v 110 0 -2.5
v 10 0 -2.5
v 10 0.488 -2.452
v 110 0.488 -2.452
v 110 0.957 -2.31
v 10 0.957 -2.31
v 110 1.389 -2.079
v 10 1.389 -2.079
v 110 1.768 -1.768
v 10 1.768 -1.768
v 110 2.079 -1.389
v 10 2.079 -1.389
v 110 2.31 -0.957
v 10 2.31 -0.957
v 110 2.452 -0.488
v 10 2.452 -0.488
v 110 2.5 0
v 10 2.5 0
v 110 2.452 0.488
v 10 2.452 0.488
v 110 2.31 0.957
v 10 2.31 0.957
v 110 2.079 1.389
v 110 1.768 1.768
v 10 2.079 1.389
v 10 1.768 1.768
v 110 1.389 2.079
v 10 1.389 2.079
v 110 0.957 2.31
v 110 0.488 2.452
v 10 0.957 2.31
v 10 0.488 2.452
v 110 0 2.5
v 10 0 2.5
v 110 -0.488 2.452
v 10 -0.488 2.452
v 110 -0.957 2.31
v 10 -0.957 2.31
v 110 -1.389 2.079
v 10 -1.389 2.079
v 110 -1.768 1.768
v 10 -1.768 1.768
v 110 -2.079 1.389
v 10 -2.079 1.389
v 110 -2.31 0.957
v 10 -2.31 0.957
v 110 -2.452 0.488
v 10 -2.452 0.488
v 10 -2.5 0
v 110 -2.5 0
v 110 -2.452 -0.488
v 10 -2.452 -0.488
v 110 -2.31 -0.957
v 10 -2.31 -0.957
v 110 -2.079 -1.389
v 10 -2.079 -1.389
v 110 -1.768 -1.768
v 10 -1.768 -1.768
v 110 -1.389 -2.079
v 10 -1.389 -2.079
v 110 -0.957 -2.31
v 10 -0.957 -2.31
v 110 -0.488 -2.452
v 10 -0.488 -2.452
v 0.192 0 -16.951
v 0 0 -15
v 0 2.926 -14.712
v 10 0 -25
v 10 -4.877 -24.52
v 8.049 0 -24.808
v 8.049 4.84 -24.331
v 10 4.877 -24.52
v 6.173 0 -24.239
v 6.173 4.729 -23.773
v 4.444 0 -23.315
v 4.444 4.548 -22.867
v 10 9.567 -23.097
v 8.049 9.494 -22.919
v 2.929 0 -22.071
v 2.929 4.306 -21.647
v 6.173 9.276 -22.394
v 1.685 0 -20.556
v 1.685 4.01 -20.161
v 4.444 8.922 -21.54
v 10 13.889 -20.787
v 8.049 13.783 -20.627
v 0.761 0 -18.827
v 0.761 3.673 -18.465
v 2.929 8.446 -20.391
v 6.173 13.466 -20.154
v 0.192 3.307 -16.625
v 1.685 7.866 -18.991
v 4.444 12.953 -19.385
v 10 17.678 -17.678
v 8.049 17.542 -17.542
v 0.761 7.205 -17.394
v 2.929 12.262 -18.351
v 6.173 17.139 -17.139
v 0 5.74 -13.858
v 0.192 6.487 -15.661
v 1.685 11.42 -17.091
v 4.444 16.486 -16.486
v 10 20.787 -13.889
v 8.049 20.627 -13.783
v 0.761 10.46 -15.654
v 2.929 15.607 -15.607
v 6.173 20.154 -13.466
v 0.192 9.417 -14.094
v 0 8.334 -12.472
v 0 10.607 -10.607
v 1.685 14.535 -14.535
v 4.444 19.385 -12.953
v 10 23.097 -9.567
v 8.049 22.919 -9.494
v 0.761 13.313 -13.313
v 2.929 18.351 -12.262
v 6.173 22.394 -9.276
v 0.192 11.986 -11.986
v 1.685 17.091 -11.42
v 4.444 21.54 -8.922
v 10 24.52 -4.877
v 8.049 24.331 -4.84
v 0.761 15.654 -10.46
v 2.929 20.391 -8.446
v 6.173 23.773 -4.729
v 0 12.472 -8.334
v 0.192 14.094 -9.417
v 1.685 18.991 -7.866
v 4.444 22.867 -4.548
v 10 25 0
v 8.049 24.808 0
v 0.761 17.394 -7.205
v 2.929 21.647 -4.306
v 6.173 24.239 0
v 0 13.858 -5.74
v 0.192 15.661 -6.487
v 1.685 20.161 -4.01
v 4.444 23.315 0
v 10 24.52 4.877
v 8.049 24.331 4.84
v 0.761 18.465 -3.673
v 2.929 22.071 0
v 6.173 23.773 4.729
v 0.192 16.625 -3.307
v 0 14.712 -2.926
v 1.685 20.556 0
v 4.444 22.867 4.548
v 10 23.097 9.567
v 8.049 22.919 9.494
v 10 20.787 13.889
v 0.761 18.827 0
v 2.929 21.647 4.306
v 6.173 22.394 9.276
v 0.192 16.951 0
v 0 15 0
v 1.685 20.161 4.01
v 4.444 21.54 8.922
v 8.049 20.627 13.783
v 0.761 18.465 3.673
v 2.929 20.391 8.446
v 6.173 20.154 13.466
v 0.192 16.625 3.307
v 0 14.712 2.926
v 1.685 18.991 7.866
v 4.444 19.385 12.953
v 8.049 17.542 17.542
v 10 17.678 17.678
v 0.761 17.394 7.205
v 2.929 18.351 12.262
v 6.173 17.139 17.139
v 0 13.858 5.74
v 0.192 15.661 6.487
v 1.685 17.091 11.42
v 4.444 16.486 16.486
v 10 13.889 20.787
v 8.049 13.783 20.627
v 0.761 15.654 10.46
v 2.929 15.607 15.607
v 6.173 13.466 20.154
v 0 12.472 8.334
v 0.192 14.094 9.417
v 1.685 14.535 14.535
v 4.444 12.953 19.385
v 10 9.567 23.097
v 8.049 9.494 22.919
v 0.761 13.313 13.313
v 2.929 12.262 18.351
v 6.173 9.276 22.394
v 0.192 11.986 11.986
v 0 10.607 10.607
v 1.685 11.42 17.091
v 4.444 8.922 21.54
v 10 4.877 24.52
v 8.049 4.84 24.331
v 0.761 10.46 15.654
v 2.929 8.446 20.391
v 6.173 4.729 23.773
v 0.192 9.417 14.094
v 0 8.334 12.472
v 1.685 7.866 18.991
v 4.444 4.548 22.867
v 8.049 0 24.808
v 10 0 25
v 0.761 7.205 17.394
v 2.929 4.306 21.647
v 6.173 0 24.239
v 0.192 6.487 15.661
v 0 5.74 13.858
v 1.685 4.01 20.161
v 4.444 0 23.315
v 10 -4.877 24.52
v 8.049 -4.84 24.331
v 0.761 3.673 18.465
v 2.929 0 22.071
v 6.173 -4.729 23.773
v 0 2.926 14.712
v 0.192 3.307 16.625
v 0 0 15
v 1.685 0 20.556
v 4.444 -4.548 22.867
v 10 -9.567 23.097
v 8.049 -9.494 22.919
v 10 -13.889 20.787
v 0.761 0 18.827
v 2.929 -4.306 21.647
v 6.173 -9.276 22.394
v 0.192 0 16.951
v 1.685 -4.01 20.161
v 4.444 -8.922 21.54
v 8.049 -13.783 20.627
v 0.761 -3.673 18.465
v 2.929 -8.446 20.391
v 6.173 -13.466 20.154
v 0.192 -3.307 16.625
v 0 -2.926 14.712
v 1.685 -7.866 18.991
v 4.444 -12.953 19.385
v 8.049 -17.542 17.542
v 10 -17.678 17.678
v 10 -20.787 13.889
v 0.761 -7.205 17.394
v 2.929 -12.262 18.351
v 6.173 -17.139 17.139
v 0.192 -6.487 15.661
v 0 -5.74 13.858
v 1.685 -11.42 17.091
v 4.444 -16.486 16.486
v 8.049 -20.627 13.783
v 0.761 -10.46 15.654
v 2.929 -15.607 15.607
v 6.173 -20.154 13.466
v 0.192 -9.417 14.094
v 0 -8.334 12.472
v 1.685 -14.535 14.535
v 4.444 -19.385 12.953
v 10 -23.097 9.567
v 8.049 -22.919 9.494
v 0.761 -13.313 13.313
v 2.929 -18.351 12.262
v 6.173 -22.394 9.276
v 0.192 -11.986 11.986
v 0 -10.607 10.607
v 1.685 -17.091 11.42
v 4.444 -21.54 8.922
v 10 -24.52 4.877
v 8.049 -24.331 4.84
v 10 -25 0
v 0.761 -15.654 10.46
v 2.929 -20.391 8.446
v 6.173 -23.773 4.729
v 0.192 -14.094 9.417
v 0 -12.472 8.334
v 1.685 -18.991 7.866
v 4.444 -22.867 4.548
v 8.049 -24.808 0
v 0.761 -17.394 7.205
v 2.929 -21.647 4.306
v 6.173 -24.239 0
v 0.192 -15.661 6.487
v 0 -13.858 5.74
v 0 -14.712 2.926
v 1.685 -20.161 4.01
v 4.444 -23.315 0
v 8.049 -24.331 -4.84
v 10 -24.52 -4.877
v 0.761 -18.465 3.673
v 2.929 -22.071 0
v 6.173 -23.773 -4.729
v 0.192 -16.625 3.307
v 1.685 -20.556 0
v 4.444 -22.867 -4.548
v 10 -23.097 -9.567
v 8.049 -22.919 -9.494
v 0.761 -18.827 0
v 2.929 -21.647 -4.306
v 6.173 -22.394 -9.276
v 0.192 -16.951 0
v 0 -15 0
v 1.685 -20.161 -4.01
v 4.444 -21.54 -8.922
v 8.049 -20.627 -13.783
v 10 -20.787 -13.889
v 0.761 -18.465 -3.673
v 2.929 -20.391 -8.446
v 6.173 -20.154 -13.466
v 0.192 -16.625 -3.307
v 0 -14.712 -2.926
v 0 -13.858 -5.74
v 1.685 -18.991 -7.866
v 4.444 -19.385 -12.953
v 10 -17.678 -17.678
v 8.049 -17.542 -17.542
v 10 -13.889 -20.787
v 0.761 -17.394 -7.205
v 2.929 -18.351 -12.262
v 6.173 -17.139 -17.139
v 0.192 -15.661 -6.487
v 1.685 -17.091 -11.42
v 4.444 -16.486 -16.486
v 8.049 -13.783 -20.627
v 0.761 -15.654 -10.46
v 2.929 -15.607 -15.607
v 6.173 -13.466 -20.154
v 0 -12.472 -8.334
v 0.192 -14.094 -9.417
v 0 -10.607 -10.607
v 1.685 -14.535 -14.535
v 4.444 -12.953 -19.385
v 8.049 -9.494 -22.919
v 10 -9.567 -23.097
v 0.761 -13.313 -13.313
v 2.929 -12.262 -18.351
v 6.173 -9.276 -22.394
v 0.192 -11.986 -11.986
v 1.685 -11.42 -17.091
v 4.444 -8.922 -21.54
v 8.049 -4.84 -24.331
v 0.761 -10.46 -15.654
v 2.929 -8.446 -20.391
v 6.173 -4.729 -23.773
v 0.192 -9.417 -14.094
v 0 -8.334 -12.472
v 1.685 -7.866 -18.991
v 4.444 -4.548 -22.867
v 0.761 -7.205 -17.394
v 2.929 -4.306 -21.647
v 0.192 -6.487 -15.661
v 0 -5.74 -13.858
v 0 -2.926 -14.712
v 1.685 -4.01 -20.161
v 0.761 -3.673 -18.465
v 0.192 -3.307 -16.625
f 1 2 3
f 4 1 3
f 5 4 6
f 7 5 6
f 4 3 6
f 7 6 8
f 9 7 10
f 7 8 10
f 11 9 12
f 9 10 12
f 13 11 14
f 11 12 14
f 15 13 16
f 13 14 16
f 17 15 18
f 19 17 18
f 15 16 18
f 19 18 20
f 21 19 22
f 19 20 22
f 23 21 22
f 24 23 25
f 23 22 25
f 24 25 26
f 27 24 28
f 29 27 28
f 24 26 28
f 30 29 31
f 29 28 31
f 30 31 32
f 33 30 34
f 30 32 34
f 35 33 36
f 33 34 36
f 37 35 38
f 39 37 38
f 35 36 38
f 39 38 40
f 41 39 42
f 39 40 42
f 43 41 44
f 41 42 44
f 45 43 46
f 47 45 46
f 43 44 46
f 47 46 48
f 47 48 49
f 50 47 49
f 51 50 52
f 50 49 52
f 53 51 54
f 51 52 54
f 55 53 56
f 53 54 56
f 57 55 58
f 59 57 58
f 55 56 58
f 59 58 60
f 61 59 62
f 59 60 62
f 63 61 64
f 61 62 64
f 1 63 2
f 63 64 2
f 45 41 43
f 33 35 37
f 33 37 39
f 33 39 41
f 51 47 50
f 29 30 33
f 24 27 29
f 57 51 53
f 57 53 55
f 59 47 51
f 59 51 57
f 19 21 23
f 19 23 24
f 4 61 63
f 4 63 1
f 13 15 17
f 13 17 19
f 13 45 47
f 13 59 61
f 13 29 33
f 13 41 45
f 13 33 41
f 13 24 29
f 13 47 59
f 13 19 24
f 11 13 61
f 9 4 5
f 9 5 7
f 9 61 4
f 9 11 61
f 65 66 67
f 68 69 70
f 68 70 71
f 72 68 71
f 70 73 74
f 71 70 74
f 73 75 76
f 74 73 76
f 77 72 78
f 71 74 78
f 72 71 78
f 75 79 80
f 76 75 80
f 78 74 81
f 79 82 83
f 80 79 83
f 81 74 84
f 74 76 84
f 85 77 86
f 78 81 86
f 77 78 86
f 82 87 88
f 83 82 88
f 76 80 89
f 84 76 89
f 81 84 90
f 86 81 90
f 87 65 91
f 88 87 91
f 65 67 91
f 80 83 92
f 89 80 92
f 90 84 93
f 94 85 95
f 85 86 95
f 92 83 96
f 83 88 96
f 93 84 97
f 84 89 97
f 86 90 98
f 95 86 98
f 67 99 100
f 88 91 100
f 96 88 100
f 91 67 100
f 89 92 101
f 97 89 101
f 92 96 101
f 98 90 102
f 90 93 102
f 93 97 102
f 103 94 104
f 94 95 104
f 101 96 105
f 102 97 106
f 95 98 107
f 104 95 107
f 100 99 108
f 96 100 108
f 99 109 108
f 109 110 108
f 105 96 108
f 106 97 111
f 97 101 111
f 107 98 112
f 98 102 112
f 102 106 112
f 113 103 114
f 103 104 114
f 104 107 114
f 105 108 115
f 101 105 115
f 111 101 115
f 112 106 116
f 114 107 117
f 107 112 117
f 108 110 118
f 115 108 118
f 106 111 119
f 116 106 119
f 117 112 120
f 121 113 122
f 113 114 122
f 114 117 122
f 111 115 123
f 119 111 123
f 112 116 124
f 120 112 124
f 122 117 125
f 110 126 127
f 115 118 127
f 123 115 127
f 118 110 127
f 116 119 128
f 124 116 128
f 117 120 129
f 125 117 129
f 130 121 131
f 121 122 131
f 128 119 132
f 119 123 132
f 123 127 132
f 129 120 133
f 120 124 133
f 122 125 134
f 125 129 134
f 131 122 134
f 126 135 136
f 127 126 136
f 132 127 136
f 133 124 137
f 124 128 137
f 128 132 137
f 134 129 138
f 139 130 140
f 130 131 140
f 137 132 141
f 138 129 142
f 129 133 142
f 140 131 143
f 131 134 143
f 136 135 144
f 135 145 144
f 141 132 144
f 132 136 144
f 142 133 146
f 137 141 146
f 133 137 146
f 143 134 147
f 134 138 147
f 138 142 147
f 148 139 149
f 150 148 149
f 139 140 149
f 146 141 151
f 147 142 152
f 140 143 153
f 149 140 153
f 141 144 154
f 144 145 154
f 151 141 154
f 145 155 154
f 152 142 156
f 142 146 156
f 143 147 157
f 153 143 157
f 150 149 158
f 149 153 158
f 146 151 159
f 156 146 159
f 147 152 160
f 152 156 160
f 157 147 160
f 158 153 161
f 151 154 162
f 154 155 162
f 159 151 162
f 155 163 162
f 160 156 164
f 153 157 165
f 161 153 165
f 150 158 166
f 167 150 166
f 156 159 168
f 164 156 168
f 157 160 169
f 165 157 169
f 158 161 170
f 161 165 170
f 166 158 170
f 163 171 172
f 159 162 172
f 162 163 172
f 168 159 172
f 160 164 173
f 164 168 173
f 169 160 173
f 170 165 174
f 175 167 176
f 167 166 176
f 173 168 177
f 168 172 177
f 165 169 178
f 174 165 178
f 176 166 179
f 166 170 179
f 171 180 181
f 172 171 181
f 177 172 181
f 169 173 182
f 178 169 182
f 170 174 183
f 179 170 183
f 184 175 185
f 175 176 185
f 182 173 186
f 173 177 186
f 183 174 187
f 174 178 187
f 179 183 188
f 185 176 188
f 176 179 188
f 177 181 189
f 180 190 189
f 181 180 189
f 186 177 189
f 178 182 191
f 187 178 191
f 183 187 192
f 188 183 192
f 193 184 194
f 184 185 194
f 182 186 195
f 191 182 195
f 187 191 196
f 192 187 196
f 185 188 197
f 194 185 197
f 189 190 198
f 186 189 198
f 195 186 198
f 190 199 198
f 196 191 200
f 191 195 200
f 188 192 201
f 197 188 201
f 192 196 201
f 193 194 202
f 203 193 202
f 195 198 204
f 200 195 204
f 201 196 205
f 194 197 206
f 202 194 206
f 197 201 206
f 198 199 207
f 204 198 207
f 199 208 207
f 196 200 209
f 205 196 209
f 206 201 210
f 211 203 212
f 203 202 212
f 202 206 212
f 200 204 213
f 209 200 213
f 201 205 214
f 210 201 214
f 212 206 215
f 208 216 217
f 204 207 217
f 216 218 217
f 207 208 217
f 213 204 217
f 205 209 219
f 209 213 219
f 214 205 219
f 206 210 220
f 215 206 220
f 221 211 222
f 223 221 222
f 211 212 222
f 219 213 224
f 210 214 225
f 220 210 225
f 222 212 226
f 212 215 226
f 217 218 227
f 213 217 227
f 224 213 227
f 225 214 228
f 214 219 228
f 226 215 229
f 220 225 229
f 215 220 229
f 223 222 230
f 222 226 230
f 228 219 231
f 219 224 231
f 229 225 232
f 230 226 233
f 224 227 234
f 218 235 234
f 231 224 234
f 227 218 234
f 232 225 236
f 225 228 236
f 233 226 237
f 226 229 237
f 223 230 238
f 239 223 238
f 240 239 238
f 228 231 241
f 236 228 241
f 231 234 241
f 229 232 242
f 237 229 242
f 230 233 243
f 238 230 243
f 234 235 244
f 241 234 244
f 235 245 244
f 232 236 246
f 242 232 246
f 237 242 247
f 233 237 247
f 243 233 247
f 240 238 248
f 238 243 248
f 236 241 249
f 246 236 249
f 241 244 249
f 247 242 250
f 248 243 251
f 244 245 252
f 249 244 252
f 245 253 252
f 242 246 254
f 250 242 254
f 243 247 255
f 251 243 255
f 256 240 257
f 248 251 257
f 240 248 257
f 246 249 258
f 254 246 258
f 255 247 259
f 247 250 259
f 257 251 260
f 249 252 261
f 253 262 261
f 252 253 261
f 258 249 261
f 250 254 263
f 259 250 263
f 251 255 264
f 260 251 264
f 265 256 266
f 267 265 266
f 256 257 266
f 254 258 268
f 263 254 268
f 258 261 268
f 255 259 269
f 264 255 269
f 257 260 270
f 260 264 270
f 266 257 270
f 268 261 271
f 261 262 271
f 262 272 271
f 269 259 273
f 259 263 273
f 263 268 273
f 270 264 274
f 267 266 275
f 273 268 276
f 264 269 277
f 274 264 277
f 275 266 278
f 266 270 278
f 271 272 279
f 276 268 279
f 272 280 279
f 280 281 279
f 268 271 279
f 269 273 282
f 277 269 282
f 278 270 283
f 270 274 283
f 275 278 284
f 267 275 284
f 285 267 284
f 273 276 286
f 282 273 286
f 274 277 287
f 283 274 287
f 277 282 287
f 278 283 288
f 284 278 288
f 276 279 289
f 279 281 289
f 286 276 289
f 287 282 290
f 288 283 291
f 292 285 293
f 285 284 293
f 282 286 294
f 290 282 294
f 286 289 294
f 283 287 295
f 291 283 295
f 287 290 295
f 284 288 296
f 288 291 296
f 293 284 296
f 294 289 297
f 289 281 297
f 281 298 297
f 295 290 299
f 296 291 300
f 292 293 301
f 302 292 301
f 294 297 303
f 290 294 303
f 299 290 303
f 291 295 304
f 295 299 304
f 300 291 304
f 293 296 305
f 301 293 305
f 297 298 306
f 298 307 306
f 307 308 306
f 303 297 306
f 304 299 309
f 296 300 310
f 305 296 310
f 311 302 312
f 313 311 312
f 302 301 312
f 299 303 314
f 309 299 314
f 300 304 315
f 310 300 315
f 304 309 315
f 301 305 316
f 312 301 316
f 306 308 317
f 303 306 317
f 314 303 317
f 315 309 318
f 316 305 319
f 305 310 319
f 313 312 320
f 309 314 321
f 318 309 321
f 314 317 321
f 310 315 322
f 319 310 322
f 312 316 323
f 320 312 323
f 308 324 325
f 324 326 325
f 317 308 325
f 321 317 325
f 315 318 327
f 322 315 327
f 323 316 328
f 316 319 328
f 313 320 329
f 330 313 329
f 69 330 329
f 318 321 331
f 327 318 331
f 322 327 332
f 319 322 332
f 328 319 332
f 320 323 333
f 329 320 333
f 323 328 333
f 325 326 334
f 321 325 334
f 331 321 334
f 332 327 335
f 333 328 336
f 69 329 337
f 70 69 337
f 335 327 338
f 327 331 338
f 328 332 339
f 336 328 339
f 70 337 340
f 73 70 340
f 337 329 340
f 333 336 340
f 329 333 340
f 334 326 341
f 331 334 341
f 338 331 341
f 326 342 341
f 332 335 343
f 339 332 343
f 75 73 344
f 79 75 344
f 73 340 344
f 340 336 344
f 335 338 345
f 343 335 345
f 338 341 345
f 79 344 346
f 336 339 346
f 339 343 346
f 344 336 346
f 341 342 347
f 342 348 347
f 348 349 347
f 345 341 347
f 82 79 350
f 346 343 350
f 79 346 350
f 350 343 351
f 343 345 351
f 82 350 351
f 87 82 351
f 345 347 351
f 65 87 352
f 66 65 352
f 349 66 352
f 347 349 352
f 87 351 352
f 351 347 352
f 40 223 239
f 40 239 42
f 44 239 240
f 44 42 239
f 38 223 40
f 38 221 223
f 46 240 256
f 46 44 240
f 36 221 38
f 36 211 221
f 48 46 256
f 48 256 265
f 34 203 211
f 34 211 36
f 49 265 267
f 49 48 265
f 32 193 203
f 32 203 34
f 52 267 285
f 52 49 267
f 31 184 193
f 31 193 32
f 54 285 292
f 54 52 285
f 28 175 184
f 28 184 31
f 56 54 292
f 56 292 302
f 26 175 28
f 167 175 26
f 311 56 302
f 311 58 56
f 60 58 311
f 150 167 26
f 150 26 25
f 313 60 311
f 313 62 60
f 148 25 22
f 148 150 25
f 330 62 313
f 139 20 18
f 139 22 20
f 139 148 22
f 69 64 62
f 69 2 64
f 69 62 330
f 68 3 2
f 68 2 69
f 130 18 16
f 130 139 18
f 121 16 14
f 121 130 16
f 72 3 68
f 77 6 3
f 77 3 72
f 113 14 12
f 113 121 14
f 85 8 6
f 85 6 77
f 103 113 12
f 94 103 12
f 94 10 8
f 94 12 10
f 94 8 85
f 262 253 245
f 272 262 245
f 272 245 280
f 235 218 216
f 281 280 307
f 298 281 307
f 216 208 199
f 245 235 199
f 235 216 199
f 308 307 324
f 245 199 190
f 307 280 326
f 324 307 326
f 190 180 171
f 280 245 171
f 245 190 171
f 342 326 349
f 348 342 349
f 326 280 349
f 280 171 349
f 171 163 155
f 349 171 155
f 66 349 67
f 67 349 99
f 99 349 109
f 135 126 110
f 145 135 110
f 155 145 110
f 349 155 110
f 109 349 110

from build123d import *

# Parameters (mm, degrees)
SKETCH1_R           = 25
BOSS_EXTRUDE1_DEPTH = 110
CUT_EXTRUDE1_START  = -100
SKETCH2_R           = 25
SKETCH2_R_2         = 2.5
CUT_EXTRUDE1_DEPTH  = 100
FILLET1_R           = 10


with BuildPart() as part:
    # Sketch1 → Boss-Extrude1 (new body)
    with BuildSketch(Plane(origin=(0, 0, 0), x_dir=(0, 0, -1), z_dir=(1, 0, 0))):
        Circle(SKETCH1_R)
    extrude(amount=BOSS_EXTRUDE1_DEPTH)

    # Sketch2 → Cut-Extrude1 (cut)
    with BuildSketch(Plane(origin=(110, 0, 0), x_dir=(0, 0, -1), z_dir=(1, 0, 0)).offset(CUT_EXTRUDE1_START)):
        Circle(SKETCH2_R)
        Circle(SKETCH2_R_2, mode=Mode.SUBTRACT)
    extrude(amount=CUT_EXTRUDE1_DEPTH, mode=Mode.SUBTRACT)

    # Fillet1
    fillet1_edges = [part.edges().sort_by_distance(p)[0] for p in [
        (0, 0, 25),
    ]]
    fillet(fillet1_edges, radius=FILLET1_R - 0.0001)  # a hair under: the kernel refuses the full size


solid = part.part
